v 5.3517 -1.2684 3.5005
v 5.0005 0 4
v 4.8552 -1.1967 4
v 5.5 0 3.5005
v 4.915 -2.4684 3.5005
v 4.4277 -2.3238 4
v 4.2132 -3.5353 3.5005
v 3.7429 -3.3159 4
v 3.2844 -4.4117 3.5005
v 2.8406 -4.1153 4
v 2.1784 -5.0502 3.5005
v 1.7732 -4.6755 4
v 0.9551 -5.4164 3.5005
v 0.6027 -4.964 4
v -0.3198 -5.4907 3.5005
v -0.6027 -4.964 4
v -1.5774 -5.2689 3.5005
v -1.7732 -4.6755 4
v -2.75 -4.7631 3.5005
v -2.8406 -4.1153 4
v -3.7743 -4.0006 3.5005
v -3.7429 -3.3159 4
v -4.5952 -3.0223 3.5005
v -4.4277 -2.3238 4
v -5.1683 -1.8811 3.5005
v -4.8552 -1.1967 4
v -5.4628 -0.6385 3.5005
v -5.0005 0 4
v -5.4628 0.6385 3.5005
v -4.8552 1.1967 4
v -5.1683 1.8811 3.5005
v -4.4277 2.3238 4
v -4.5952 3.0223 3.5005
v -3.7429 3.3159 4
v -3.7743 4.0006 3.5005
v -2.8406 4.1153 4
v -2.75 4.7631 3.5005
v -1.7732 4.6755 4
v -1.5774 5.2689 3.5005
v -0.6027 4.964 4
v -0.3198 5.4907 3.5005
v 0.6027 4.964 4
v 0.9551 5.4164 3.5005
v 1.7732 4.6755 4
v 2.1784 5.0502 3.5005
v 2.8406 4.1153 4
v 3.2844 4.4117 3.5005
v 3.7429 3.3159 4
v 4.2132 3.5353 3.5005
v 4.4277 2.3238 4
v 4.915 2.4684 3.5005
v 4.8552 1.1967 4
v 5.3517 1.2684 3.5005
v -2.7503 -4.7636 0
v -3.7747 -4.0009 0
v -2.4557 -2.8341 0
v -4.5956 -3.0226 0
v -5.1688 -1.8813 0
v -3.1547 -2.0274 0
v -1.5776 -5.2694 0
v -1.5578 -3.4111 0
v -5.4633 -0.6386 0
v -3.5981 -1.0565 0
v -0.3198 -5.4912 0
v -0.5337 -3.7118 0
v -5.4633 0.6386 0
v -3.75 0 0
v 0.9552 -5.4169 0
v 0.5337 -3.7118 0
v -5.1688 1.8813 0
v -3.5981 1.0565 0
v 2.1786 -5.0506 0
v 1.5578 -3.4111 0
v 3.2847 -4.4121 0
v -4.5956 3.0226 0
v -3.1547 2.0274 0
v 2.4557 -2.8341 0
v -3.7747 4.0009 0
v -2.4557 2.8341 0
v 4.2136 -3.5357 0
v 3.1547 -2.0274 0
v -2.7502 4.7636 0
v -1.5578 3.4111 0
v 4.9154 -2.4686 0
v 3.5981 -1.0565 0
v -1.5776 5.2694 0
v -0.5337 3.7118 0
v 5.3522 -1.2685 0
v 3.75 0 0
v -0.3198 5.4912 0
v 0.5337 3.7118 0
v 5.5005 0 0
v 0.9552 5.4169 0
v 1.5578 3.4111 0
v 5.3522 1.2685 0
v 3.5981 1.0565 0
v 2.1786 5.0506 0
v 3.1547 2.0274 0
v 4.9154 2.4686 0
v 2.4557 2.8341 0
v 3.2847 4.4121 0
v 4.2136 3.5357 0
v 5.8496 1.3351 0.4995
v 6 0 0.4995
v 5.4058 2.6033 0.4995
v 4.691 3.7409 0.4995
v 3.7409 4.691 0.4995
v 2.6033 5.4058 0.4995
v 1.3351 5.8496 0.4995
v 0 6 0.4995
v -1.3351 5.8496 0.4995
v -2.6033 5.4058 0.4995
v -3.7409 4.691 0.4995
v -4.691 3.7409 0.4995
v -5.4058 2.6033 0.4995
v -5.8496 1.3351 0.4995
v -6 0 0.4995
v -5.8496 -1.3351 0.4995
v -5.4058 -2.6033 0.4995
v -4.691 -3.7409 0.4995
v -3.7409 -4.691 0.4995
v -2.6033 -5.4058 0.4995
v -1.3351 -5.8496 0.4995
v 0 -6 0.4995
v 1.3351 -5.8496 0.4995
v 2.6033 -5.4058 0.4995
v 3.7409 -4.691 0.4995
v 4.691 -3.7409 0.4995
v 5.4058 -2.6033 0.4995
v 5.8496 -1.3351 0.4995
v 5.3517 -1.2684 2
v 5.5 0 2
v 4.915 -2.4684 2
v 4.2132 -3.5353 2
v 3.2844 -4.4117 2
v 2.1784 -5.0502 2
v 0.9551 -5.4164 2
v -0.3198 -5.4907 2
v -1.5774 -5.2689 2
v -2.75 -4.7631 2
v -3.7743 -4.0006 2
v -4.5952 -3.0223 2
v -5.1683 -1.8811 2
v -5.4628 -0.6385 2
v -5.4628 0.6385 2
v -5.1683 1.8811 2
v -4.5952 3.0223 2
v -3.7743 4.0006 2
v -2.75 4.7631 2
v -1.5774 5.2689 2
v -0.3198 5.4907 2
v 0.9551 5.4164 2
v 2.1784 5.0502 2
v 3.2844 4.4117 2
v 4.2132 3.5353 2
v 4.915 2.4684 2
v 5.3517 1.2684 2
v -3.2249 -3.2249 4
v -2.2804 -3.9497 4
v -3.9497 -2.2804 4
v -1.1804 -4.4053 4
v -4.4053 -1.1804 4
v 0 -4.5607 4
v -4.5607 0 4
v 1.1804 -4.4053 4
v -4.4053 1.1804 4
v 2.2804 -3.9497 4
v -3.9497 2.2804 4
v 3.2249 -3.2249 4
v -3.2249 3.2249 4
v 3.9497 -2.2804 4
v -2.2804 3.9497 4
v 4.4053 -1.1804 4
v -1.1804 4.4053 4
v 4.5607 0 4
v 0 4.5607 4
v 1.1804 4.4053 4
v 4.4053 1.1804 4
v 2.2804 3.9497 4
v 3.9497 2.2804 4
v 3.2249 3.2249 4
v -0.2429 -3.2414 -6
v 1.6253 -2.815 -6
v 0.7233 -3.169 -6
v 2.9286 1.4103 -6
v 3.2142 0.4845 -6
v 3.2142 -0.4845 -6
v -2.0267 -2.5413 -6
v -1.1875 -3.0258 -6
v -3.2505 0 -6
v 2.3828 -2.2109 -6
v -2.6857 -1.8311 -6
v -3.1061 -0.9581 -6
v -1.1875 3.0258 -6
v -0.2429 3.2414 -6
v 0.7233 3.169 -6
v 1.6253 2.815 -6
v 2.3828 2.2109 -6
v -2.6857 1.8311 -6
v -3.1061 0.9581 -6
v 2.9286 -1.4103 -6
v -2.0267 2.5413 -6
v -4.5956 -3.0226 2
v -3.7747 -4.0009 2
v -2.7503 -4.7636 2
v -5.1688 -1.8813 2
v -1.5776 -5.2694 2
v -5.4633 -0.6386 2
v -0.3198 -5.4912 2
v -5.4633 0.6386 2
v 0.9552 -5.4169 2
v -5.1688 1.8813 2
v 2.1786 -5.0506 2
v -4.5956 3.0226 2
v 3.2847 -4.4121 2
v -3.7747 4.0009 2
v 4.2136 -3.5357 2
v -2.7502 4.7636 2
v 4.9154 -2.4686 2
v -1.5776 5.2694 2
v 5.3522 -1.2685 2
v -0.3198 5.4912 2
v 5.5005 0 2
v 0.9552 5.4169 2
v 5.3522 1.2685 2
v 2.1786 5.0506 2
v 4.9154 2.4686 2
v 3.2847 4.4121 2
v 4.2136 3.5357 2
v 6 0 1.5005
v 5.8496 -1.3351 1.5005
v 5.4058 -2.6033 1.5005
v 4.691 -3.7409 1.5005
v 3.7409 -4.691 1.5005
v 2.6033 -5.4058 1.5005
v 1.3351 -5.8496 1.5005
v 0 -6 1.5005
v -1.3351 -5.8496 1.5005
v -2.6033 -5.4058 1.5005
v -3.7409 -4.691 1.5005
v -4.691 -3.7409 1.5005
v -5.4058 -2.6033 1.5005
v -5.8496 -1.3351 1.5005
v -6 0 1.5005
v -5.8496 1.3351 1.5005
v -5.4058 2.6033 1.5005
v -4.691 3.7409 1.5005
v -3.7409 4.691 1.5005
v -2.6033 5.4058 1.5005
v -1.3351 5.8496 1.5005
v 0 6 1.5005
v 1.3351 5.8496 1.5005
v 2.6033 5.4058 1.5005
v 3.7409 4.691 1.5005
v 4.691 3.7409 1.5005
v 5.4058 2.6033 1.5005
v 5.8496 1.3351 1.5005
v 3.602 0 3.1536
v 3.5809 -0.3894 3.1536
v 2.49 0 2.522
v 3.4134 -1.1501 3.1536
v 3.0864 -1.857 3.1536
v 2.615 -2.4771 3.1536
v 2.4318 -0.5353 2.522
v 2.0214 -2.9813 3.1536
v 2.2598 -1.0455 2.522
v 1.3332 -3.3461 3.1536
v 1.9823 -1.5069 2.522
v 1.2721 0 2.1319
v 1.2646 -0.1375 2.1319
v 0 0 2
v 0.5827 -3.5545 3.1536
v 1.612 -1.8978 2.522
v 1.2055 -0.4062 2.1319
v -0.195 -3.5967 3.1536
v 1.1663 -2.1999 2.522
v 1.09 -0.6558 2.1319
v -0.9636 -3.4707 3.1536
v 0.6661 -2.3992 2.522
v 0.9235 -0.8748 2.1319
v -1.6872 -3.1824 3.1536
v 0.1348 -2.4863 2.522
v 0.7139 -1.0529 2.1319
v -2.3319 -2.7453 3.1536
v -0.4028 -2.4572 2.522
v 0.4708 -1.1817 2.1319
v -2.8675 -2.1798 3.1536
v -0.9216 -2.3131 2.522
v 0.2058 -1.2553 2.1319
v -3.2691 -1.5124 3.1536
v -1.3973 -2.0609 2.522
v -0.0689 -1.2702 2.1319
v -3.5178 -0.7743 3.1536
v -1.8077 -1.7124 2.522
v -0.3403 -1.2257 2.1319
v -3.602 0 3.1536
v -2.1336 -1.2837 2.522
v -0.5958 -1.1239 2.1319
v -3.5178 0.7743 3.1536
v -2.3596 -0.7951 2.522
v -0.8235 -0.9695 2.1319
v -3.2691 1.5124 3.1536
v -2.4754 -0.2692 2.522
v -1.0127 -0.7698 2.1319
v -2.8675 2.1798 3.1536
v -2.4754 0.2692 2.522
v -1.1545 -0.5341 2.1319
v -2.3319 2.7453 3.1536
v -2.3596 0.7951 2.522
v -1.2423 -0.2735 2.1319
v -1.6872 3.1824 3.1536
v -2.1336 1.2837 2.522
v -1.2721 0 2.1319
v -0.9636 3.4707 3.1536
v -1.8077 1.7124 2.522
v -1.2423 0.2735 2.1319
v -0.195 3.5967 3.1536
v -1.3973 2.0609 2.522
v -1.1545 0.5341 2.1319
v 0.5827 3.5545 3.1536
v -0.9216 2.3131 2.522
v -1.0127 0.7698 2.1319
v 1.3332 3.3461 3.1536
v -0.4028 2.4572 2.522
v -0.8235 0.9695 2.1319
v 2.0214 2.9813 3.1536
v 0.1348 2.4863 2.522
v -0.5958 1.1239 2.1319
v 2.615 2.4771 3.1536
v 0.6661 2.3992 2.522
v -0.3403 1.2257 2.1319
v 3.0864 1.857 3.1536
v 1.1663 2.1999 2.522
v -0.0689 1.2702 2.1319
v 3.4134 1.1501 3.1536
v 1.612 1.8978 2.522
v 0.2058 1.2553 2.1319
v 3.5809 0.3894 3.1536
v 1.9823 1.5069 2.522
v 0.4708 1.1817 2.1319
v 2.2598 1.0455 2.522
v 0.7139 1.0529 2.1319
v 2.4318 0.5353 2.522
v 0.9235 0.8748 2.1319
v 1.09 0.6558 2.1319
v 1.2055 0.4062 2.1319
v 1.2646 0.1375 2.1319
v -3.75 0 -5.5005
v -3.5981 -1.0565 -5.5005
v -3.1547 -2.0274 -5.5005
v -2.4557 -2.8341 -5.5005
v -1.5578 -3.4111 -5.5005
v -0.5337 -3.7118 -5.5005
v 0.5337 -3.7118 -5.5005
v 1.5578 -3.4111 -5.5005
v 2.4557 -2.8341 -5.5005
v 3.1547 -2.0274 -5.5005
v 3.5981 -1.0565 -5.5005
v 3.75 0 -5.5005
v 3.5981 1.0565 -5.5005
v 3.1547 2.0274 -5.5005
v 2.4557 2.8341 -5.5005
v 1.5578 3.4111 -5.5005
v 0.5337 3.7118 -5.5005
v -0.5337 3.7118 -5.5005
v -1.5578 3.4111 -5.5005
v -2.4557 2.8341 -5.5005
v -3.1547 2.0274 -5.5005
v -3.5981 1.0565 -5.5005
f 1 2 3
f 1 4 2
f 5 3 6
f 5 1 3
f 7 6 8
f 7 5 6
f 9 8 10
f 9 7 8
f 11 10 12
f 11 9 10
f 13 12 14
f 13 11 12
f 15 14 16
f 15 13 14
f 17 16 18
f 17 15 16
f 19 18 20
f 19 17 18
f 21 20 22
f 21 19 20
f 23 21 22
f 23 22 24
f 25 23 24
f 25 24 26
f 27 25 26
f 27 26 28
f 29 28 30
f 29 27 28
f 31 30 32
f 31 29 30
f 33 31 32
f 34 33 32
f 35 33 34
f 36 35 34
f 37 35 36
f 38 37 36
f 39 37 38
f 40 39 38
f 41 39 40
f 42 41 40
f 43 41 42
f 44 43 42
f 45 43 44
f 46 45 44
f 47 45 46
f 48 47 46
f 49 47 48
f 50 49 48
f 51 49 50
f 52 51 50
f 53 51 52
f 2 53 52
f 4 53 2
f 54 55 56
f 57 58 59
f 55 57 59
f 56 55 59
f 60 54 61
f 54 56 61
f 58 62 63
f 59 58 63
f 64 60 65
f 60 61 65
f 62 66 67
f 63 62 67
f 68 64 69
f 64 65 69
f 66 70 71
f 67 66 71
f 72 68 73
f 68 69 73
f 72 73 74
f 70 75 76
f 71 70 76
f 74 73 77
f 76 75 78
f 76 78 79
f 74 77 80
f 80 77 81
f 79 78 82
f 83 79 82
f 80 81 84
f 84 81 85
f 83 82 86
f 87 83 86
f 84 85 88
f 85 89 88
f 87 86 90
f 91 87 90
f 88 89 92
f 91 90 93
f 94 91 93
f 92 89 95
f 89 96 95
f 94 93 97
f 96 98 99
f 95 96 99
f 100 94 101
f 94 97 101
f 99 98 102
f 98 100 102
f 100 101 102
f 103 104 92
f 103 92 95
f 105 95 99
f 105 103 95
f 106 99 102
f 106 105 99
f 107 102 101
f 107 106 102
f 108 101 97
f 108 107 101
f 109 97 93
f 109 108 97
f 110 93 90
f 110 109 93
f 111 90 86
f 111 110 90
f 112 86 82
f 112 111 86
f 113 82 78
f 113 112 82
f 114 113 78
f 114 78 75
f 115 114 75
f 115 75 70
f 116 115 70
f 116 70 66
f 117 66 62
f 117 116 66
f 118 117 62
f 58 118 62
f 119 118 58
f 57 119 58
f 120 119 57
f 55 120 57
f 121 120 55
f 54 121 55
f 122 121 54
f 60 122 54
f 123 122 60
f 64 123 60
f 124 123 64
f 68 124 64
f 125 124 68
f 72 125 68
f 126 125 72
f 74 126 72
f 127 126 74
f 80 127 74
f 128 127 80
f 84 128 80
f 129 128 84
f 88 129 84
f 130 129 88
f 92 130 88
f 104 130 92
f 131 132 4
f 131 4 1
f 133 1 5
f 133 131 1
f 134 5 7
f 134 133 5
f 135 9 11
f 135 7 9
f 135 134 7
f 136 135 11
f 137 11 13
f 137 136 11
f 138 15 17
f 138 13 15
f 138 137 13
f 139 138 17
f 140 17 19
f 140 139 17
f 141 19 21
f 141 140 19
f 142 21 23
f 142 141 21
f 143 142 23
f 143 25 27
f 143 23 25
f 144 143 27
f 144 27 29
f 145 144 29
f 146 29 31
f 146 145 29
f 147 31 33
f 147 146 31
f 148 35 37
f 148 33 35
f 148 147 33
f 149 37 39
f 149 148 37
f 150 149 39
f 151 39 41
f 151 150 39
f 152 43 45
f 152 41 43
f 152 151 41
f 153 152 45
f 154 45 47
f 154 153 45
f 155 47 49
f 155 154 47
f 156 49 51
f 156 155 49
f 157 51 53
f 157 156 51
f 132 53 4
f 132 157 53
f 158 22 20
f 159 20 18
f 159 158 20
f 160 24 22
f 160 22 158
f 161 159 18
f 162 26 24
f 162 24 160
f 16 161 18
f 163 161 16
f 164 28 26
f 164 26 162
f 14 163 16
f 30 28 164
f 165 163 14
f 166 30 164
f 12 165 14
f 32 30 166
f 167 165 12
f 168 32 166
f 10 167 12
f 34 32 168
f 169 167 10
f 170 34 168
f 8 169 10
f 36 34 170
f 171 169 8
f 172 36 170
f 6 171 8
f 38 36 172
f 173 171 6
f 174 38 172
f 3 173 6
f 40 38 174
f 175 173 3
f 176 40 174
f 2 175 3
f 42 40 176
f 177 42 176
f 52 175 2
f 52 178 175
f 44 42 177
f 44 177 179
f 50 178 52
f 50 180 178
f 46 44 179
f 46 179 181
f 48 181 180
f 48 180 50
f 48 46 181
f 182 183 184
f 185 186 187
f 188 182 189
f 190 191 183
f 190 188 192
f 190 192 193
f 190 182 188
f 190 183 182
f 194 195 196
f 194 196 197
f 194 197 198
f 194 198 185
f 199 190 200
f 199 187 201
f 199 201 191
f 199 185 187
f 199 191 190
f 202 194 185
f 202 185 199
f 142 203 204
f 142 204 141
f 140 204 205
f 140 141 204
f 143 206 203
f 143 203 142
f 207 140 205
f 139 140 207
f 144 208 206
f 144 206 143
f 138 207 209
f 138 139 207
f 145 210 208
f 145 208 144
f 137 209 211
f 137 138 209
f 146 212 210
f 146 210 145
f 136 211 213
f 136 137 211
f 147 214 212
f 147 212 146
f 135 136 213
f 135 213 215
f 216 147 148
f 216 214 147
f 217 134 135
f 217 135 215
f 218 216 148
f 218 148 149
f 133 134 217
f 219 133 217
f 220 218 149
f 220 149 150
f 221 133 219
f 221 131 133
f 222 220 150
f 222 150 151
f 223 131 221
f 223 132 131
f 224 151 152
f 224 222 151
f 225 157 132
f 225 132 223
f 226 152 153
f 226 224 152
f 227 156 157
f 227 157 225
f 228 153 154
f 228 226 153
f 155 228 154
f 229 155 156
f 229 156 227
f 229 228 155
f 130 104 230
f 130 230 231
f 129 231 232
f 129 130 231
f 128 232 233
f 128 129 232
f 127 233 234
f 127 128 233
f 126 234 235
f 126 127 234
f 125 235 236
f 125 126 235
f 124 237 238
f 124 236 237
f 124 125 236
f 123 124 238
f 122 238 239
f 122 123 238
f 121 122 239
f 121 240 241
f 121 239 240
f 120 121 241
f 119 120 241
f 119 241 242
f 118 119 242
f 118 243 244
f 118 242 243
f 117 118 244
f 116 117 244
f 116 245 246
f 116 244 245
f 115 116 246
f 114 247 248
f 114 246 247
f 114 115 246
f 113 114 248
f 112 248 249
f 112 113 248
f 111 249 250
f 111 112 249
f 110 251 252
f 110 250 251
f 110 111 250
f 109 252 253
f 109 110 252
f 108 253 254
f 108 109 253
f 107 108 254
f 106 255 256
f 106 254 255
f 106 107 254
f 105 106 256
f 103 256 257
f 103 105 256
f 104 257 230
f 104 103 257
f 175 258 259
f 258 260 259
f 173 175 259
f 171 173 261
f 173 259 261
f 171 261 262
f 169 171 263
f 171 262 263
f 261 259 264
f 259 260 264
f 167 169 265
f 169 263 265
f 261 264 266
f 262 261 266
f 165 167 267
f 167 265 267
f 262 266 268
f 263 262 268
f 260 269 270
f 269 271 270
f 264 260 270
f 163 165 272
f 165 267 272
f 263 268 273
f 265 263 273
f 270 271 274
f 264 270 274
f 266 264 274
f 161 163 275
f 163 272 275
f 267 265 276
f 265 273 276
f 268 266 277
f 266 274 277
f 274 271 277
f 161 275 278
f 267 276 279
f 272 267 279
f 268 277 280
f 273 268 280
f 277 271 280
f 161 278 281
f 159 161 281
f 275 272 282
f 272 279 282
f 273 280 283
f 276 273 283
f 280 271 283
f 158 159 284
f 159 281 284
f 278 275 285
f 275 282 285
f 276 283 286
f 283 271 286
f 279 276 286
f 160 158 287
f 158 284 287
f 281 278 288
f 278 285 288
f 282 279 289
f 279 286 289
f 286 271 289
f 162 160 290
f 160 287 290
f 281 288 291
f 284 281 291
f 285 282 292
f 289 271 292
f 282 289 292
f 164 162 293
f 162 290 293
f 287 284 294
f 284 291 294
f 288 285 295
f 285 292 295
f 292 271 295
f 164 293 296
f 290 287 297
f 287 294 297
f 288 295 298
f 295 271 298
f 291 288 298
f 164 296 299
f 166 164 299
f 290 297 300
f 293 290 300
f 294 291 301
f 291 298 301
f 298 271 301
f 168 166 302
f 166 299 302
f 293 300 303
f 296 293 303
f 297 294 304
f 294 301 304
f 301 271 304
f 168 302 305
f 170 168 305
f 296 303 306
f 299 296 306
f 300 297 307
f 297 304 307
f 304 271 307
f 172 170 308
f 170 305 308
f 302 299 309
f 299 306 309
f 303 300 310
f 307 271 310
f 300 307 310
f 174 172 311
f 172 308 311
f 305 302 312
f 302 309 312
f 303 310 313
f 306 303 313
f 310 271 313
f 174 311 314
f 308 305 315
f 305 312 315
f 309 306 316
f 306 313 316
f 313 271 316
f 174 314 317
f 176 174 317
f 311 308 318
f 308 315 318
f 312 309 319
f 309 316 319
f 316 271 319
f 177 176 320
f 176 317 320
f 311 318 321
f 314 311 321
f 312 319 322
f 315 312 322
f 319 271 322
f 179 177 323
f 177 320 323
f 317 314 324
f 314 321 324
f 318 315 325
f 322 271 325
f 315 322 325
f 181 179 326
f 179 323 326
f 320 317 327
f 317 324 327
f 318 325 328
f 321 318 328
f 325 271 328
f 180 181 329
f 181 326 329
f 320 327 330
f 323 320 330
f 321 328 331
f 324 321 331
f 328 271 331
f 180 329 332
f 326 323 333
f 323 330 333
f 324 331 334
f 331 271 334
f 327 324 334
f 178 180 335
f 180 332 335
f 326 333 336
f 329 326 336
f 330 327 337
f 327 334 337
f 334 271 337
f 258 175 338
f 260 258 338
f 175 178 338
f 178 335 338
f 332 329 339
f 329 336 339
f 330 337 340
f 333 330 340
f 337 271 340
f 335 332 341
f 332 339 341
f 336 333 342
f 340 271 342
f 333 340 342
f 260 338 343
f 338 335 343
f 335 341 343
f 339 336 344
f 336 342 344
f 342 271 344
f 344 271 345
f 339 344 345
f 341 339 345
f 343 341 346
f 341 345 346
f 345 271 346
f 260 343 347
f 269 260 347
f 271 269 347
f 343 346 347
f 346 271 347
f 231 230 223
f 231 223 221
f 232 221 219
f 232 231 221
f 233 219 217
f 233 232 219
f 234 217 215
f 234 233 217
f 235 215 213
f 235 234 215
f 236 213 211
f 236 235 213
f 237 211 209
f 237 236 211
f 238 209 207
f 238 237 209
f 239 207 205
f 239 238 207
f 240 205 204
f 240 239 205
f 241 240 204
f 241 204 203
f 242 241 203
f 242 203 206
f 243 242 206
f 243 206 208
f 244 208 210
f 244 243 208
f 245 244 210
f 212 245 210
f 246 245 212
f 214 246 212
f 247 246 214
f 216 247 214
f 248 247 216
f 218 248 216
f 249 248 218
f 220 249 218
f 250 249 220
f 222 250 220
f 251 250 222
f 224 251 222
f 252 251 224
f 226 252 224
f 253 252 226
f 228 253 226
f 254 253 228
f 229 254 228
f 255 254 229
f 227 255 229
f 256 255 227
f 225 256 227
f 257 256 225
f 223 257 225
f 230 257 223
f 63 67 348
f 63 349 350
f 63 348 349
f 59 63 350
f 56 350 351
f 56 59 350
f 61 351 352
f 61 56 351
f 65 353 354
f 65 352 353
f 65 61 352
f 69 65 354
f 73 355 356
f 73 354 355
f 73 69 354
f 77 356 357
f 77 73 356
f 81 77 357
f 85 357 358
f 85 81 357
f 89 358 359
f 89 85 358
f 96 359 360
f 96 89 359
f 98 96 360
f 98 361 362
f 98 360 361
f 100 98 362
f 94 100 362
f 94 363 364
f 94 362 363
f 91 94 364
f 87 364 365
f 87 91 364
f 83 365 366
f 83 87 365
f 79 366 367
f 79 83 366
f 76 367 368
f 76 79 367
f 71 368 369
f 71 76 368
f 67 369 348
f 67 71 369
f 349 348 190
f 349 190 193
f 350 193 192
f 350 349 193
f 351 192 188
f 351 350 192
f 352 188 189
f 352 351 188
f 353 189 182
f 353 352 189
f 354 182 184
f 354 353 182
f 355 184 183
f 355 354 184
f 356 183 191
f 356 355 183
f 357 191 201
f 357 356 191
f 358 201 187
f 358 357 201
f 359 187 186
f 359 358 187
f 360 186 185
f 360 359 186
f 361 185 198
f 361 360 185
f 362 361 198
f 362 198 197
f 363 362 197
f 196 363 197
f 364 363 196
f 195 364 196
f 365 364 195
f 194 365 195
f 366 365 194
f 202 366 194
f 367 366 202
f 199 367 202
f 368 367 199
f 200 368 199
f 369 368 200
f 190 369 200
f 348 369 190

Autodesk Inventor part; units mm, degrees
ref_plane "YZ Plane" through (0, 0, 0) normal (1, 0, 0) x (0, 1, 0)
ref_plane "XZ Plane" through (0, 0, 0) normal (0, 1, 0) x (-1, 0, 0)
ref_plane "XY Plane" through (0, 0, 0) normal (0, 0, 1) x (1, 0, 0)
sketch "草图1" plane through (0, 0, 0) normal (0, 0, 1) x (1, 0, 0)
  circle A0 centre (0, 0) radius 6
  dimension "d0" = 12
extrude "拉伸1" add sketch "草图1" along normal blind 2
sketch "草图2" plane through (0, 0, 2) normal (0, 0, 1) x (1, 0, 0)
  circle A0 centre (0, 0) radius 6 projected
  circle A1 centre (0, 0) radius 5.5
  dimension "d3" = 11
extrude "拉伸2" add sketch "草图2" along normal blind 2 contours A1
sketch "草图3" plane through (0, 0, 0) normal (0, 0, -1) x (-1, 0, 0)
  circle A0 centre (0, 0) radius 6 projected
  circle A1 centre (0, 0) radius 3.75
  dimension "d6" = 7.5
extrude "拉伸3" add sketch "草图3" along normal blind 6 contours A1
sketch "草图4" plane through (0, 0, 0) normal (0, 1, 0) x (-1, 0, 0)
  line L0 (6, 2) -> (-6, 2) projected
  arc A0 (0, 14.4) -> (0, 2) centre (0, 8.2) ccw
  line L1 (0, 2) -> (0, 14.4)
  point P0 (0, 0)
revolve "旋转1" cut sketch "草图4" angle 360 about axis through (0, 0, 2) along (0, 0, 1)
chamfer "倒角1" distance 0.5 angle 45 4 edges at (3.75, 0, -6) (-6, 0, 0) (-6, 0, 2) (-5.5, 0, 4)
properties part number "钢珠定位圈" material "钢"
